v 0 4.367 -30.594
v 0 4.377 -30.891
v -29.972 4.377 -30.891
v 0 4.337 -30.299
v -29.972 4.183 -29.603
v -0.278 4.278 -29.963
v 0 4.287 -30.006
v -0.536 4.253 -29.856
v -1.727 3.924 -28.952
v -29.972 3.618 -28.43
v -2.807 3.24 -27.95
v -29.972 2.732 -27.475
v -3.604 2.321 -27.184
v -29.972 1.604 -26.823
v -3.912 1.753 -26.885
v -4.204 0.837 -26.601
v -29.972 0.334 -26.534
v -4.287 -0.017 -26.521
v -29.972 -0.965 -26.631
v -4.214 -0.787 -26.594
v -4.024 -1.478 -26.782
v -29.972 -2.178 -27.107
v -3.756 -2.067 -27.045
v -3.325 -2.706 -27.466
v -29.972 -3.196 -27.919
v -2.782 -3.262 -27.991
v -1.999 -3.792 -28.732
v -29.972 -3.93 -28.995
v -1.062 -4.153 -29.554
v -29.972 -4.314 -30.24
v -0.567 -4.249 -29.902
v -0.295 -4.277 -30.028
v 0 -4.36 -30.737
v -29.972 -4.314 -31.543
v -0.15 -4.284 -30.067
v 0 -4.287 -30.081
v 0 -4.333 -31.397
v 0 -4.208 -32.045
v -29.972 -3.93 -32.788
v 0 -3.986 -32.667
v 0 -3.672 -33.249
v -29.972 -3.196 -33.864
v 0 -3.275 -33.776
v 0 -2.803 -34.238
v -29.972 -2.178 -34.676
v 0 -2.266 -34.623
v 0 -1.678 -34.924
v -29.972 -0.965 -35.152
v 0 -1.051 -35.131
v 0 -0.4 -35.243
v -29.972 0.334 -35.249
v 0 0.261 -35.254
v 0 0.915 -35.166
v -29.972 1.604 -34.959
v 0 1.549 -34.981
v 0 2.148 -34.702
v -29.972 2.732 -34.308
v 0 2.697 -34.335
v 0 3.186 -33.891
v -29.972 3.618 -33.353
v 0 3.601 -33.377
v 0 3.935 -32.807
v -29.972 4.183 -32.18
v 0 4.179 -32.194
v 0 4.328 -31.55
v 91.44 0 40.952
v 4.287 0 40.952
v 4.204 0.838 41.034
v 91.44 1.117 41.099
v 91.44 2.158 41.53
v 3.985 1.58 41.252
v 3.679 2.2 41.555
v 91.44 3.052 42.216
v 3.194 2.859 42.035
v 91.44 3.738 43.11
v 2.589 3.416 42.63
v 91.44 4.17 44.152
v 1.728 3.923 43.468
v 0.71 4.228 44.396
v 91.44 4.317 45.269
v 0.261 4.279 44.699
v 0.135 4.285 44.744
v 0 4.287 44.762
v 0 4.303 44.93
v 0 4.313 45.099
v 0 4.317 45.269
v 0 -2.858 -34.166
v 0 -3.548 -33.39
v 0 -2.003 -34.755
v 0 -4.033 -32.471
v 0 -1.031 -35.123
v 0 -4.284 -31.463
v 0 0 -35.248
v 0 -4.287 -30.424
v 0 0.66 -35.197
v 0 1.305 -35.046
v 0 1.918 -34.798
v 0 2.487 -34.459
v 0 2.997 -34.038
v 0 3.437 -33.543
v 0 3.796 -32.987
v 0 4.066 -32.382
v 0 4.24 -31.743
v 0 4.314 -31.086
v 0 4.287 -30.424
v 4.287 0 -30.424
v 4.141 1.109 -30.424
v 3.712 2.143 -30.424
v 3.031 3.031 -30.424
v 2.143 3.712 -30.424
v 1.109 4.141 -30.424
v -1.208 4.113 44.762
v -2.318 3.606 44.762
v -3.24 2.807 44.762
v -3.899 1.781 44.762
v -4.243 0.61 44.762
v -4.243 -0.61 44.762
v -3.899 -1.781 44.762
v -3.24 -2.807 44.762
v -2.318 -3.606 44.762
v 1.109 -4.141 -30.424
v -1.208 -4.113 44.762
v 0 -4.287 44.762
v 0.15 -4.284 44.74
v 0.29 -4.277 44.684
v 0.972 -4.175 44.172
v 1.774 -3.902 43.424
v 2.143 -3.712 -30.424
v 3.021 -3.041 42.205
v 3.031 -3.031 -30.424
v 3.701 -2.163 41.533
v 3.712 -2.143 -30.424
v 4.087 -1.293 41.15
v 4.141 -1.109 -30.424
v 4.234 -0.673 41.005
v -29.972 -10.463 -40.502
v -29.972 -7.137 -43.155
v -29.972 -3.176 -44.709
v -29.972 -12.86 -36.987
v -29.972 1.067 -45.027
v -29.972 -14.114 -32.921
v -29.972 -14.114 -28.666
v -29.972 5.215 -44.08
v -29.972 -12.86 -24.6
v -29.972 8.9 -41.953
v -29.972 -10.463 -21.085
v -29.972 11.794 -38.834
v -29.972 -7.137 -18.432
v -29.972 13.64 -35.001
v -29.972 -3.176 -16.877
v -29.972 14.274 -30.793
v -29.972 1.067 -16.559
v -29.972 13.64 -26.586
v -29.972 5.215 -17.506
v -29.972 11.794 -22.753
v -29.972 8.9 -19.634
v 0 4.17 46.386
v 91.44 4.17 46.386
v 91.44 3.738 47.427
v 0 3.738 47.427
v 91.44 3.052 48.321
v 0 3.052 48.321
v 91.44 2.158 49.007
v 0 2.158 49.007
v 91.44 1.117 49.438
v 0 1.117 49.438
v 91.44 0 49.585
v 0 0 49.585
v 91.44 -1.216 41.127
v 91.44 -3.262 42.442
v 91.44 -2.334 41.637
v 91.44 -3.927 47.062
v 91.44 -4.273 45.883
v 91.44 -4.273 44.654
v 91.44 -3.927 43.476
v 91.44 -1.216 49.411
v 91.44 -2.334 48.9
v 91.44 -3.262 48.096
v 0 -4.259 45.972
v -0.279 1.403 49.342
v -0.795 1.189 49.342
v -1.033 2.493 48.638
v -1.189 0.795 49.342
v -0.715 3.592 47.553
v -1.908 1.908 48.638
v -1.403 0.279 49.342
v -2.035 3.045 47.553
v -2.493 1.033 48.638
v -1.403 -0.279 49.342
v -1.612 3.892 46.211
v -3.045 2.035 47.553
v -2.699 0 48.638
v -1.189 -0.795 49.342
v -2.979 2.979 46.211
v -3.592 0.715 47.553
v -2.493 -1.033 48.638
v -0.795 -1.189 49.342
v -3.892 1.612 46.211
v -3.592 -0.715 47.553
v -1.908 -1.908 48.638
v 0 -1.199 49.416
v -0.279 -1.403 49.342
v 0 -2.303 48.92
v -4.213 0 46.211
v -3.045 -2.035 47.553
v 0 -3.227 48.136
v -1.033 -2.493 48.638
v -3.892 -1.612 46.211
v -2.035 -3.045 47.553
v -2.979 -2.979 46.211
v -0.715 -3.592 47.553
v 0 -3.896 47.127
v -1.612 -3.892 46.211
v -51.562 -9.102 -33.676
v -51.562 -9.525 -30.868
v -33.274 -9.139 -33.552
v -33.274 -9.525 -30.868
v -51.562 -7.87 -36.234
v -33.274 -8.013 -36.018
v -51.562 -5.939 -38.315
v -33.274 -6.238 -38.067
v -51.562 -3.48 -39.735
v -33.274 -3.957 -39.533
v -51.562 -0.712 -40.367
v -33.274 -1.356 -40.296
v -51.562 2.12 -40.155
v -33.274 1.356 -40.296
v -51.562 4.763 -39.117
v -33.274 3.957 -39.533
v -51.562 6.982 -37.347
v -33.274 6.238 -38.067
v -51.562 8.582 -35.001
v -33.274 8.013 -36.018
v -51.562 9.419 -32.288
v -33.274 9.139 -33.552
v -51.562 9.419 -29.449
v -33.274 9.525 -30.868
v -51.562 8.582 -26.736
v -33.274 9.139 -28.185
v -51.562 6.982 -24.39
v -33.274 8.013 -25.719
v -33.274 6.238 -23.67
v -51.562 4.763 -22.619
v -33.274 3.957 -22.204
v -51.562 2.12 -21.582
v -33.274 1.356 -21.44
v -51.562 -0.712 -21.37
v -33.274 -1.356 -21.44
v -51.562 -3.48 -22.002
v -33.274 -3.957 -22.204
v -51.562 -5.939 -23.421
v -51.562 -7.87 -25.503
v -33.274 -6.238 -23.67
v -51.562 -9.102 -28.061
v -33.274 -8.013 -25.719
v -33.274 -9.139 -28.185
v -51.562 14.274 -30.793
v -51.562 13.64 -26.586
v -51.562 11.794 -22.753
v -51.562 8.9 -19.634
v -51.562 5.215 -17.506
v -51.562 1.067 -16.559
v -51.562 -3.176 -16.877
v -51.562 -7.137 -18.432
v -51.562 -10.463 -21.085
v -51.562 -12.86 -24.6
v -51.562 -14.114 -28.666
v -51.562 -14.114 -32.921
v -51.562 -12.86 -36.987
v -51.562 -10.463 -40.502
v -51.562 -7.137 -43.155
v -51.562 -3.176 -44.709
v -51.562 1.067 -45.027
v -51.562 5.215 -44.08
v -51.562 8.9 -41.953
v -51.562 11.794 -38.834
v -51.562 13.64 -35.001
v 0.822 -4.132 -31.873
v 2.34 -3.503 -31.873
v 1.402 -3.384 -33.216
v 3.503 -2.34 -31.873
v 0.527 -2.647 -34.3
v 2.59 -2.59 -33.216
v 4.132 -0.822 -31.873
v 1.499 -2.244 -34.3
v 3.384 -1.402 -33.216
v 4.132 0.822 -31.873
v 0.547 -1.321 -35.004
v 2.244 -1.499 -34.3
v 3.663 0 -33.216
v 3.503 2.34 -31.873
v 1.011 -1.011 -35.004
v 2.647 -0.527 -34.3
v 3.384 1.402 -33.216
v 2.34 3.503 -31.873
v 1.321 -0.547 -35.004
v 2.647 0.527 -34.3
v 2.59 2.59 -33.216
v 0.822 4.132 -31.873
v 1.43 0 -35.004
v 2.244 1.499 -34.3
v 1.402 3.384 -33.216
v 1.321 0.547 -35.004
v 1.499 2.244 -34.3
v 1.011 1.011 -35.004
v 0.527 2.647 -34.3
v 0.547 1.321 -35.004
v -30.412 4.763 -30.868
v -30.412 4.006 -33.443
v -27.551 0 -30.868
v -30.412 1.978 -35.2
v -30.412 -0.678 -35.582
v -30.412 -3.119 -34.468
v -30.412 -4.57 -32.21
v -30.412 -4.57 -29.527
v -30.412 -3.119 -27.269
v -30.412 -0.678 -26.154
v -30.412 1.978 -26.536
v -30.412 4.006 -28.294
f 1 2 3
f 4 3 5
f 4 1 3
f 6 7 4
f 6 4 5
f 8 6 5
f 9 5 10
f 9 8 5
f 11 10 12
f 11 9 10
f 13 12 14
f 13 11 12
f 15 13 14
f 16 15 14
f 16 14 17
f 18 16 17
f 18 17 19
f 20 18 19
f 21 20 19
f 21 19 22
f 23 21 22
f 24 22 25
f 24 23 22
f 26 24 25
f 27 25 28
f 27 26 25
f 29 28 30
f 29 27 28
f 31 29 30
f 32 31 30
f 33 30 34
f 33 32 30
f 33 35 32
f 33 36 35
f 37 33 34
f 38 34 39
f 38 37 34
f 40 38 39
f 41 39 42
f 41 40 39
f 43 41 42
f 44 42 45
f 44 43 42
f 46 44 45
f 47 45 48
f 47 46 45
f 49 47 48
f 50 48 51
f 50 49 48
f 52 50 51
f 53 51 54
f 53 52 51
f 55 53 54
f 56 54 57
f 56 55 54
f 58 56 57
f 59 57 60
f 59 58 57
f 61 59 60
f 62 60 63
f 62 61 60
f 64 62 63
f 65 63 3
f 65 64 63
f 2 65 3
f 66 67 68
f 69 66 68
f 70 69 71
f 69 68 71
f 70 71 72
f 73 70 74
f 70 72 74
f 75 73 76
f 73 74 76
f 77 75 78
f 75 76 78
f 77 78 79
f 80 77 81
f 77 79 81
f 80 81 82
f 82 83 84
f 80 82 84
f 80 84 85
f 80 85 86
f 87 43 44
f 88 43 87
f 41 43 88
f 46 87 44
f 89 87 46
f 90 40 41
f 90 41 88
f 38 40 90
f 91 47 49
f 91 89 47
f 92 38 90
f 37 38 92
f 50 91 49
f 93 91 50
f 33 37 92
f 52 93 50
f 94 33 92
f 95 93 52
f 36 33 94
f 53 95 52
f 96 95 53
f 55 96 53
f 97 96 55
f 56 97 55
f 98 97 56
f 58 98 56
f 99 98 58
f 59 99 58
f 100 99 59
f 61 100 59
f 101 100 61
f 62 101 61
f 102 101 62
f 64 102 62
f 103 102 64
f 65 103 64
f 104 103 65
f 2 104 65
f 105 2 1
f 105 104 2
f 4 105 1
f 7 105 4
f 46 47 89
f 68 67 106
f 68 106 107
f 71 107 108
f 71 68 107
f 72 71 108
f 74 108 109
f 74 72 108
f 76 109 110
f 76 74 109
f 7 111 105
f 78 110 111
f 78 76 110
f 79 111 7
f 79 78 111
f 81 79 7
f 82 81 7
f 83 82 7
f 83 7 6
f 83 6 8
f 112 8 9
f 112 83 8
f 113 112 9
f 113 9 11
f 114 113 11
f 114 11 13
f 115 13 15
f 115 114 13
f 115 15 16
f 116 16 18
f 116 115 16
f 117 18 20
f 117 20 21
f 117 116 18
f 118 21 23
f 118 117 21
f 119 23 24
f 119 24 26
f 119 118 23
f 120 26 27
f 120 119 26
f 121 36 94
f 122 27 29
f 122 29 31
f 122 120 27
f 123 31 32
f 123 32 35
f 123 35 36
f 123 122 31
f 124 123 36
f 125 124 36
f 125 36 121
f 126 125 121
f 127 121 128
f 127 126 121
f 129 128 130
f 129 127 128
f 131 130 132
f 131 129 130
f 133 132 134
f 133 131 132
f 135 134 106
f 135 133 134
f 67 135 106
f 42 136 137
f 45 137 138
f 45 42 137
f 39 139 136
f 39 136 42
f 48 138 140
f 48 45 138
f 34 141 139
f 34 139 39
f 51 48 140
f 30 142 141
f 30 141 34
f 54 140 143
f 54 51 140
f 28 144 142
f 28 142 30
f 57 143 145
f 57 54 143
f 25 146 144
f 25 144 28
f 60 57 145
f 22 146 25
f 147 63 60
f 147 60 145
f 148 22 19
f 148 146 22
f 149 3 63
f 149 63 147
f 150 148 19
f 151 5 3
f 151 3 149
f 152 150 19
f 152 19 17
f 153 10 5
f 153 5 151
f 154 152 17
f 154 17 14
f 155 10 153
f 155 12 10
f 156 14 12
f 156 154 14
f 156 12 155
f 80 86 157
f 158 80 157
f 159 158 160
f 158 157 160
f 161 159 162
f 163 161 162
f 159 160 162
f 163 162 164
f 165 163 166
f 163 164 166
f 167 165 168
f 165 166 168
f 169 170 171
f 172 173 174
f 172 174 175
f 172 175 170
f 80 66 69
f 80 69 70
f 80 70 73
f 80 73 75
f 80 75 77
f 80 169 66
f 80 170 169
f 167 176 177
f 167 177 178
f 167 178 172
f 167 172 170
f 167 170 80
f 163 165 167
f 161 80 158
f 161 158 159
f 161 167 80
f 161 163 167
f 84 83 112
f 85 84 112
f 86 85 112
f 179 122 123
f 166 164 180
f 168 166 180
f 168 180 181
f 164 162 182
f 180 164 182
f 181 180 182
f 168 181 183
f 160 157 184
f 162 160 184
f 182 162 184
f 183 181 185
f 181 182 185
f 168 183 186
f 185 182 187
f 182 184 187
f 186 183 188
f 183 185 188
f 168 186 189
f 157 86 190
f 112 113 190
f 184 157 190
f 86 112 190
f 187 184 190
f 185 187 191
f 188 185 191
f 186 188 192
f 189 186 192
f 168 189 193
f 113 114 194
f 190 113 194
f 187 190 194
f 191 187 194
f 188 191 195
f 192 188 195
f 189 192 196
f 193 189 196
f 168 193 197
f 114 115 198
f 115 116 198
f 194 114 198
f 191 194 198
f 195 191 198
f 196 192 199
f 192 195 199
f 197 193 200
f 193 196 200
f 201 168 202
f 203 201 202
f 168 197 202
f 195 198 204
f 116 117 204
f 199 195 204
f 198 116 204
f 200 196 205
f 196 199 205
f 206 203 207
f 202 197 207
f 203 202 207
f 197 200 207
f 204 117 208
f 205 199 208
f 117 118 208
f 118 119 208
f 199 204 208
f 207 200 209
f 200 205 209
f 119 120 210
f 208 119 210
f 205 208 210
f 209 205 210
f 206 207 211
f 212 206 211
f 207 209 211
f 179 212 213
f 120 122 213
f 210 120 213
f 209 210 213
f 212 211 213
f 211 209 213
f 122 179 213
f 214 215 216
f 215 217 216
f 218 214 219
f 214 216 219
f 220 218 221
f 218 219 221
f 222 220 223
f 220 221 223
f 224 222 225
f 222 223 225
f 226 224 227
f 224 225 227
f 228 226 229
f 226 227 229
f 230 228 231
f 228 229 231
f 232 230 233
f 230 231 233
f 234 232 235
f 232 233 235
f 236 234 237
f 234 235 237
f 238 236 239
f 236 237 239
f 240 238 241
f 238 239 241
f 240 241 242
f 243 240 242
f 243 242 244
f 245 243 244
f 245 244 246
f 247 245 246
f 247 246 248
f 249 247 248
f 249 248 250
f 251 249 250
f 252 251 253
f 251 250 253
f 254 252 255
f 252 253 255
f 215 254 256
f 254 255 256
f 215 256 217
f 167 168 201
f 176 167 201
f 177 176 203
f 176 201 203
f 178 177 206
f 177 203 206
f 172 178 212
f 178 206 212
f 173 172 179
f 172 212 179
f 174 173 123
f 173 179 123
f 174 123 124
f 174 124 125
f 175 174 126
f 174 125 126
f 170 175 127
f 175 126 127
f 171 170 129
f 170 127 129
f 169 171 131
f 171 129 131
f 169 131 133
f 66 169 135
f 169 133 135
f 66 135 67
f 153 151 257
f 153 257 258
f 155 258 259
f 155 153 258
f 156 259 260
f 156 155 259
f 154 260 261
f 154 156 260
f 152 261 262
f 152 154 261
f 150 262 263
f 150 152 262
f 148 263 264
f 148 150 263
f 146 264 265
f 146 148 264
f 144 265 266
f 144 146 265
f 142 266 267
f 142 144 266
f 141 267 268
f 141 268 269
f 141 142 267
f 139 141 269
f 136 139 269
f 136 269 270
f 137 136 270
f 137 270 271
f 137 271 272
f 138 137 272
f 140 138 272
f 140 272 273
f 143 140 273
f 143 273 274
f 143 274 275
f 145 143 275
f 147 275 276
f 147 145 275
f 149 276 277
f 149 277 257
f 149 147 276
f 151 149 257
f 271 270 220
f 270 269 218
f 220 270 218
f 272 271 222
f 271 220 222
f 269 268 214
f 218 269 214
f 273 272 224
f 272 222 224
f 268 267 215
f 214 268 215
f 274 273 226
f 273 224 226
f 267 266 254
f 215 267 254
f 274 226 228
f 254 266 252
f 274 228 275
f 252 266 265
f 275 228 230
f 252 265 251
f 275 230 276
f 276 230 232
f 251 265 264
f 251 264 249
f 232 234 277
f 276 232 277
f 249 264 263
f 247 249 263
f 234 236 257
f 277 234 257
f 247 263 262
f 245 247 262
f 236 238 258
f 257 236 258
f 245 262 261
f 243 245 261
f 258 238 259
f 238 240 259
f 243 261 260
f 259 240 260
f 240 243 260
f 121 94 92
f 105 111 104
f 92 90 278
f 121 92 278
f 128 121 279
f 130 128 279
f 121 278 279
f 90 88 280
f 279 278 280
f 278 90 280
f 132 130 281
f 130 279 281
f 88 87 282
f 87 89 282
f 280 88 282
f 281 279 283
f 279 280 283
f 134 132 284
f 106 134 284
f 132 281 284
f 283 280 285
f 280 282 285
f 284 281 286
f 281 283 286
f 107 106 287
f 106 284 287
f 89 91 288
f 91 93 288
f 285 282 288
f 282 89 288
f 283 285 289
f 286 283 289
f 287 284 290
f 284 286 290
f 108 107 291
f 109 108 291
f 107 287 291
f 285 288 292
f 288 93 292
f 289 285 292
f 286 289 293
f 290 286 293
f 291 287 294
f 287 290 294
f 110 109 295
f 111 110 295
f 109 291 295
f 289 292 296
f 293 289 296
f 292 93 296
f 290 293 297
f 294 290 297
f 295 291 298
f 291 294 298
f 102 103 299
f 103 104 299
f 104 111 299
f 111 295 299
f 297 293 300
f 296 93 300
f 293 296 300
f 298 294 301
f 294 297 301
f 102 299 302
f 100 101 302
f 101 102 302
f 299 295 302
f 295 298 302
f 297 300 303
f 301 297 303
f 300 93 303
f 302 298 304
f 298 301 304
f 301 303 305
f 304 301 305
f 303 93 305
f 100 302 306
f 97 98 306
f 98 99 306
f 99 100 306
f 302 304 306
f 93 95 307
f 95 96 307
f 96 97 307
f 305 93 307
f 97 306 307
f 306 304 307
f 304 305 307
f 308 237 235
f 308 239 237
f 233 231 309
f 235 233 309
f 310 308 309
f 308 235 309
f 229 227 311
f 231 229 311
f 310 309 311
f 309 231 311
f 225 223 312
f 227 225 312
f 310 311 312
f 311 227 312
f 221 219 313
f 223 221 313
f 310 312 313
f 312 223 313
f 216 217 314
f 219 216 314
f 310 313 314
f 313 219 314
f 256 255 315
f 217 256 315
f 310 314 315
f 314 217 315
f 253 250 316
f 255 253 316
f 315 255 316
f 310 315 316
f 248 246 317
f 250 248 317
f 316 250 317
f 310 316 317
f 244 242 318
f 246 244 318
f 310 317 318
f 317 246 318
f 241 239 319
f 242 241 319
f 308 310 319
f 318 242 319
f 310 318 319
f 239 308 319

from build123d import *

# Parameters (mm, degrees)
F3_DEPTH  = 91.44
F6_R      = 4.2867636814
F7_DEPTH  = 76.2
F9_R      = 4.3700650399
F14_DEPTH = 29.972
F13_R     = 14.2738444306
F15_DEPTH = 21.59
F16_D     = 19.05
F16_DEPTH = 18.288
F16_TIP   = 5.7231973962


with BuildPart() as f3:
    # F0 (on Right) → F3 (new body)
    with BuildSketch(Plane.YZ):
        with BuildLine():
            ThreePointArc((0, 40.9521651562), (3.0523323842, 42.2164826266), (4.3166498546, 45.2688150108))
            ThreePointArc((4.3166498546, 45.2688150108), (3.0523323842, 48.321147395), (0, 49.5854648654))
            Line((0, 49.5854648654), (0, 40.9521651562))
        make_face()
        with BuildLine():
            Line((0, 40.9521651562), (0, 49.5854648654))
            ThreePointArc((0, 49.5854648654), (-4.3166498546, 45.2688150108), (0, 40.9521651562))
        make_face()
    extrude(amount=F3_DEPTH)



with BuildPart() as f4:
    # F0 (on Right) → F4 (revolve)
    with BuildSketch(Plane.YZ):
        with BuildLine():
            Line((0, 40.9521651562), (0, 49.5854648654))
            ThreePointArc((0, 49.5854648654), (-4.3166498546, 45.2688150108), (0, 40.9521651562))
        make_face()
    revolve(axis=Axis((0, 0, 45.2688150108), (0, 0, 1)))


with BuildPart() as f7:
    # F6 (on offset) → F7 (new body)
    with BuildSketch(Plane.XY.offset(45.26788)):
        Circle(F6_R)
    extrude(amount=-F7_DEPTH)


with BuildPart() as f8_1:
    # F8: copy of F4
    add(f4.part.moved(Location((0, 0, -76.2))))


with BuildPart() as f14:
    # F9 (on Right) → F14 (new body)
    with BuildSketch(Plane.YZ):
        with Locations((0.0073989029, -30.8914642022)):
            Circle(F9_R)
    extrude(amount=-F14_DEPTH)


with BuildPart() as f3_1:
    add(f3.part)

    add(f4.part)  # F15 merges F4

    add(f7.part)  # F15 merges F7

    add(f8_1.part)  # F15 merges F8_1

    add(f14.part)  # F15 merges F14
    # F13 (on offset) → F15 (join)
    with BuildSketch(Plane.YZ.offset(-29.972)):
        with Locations((0, -30.7933222502)):
            Circle(F13_R)
    extrude(amount=-F15_DEPTH)

    # F16
    with Locations(Plane(origin=(-51.562, 0, 0), x_dir=(0, 1, 0), z_dir=(-1, 0, 0))):
        with Locations((0, 30.8683142066)):
            Hole(F16_D / 2, depth=F16_DEPTH)
            with Locations((0, 0, -(F16_DEPTH + F16_TIP / 2))):  # 118° drill point
                Cone(0, F16_D / 2, F16_TIP, mode=Mode.SUBTRACT)


solid = f3_1.part
